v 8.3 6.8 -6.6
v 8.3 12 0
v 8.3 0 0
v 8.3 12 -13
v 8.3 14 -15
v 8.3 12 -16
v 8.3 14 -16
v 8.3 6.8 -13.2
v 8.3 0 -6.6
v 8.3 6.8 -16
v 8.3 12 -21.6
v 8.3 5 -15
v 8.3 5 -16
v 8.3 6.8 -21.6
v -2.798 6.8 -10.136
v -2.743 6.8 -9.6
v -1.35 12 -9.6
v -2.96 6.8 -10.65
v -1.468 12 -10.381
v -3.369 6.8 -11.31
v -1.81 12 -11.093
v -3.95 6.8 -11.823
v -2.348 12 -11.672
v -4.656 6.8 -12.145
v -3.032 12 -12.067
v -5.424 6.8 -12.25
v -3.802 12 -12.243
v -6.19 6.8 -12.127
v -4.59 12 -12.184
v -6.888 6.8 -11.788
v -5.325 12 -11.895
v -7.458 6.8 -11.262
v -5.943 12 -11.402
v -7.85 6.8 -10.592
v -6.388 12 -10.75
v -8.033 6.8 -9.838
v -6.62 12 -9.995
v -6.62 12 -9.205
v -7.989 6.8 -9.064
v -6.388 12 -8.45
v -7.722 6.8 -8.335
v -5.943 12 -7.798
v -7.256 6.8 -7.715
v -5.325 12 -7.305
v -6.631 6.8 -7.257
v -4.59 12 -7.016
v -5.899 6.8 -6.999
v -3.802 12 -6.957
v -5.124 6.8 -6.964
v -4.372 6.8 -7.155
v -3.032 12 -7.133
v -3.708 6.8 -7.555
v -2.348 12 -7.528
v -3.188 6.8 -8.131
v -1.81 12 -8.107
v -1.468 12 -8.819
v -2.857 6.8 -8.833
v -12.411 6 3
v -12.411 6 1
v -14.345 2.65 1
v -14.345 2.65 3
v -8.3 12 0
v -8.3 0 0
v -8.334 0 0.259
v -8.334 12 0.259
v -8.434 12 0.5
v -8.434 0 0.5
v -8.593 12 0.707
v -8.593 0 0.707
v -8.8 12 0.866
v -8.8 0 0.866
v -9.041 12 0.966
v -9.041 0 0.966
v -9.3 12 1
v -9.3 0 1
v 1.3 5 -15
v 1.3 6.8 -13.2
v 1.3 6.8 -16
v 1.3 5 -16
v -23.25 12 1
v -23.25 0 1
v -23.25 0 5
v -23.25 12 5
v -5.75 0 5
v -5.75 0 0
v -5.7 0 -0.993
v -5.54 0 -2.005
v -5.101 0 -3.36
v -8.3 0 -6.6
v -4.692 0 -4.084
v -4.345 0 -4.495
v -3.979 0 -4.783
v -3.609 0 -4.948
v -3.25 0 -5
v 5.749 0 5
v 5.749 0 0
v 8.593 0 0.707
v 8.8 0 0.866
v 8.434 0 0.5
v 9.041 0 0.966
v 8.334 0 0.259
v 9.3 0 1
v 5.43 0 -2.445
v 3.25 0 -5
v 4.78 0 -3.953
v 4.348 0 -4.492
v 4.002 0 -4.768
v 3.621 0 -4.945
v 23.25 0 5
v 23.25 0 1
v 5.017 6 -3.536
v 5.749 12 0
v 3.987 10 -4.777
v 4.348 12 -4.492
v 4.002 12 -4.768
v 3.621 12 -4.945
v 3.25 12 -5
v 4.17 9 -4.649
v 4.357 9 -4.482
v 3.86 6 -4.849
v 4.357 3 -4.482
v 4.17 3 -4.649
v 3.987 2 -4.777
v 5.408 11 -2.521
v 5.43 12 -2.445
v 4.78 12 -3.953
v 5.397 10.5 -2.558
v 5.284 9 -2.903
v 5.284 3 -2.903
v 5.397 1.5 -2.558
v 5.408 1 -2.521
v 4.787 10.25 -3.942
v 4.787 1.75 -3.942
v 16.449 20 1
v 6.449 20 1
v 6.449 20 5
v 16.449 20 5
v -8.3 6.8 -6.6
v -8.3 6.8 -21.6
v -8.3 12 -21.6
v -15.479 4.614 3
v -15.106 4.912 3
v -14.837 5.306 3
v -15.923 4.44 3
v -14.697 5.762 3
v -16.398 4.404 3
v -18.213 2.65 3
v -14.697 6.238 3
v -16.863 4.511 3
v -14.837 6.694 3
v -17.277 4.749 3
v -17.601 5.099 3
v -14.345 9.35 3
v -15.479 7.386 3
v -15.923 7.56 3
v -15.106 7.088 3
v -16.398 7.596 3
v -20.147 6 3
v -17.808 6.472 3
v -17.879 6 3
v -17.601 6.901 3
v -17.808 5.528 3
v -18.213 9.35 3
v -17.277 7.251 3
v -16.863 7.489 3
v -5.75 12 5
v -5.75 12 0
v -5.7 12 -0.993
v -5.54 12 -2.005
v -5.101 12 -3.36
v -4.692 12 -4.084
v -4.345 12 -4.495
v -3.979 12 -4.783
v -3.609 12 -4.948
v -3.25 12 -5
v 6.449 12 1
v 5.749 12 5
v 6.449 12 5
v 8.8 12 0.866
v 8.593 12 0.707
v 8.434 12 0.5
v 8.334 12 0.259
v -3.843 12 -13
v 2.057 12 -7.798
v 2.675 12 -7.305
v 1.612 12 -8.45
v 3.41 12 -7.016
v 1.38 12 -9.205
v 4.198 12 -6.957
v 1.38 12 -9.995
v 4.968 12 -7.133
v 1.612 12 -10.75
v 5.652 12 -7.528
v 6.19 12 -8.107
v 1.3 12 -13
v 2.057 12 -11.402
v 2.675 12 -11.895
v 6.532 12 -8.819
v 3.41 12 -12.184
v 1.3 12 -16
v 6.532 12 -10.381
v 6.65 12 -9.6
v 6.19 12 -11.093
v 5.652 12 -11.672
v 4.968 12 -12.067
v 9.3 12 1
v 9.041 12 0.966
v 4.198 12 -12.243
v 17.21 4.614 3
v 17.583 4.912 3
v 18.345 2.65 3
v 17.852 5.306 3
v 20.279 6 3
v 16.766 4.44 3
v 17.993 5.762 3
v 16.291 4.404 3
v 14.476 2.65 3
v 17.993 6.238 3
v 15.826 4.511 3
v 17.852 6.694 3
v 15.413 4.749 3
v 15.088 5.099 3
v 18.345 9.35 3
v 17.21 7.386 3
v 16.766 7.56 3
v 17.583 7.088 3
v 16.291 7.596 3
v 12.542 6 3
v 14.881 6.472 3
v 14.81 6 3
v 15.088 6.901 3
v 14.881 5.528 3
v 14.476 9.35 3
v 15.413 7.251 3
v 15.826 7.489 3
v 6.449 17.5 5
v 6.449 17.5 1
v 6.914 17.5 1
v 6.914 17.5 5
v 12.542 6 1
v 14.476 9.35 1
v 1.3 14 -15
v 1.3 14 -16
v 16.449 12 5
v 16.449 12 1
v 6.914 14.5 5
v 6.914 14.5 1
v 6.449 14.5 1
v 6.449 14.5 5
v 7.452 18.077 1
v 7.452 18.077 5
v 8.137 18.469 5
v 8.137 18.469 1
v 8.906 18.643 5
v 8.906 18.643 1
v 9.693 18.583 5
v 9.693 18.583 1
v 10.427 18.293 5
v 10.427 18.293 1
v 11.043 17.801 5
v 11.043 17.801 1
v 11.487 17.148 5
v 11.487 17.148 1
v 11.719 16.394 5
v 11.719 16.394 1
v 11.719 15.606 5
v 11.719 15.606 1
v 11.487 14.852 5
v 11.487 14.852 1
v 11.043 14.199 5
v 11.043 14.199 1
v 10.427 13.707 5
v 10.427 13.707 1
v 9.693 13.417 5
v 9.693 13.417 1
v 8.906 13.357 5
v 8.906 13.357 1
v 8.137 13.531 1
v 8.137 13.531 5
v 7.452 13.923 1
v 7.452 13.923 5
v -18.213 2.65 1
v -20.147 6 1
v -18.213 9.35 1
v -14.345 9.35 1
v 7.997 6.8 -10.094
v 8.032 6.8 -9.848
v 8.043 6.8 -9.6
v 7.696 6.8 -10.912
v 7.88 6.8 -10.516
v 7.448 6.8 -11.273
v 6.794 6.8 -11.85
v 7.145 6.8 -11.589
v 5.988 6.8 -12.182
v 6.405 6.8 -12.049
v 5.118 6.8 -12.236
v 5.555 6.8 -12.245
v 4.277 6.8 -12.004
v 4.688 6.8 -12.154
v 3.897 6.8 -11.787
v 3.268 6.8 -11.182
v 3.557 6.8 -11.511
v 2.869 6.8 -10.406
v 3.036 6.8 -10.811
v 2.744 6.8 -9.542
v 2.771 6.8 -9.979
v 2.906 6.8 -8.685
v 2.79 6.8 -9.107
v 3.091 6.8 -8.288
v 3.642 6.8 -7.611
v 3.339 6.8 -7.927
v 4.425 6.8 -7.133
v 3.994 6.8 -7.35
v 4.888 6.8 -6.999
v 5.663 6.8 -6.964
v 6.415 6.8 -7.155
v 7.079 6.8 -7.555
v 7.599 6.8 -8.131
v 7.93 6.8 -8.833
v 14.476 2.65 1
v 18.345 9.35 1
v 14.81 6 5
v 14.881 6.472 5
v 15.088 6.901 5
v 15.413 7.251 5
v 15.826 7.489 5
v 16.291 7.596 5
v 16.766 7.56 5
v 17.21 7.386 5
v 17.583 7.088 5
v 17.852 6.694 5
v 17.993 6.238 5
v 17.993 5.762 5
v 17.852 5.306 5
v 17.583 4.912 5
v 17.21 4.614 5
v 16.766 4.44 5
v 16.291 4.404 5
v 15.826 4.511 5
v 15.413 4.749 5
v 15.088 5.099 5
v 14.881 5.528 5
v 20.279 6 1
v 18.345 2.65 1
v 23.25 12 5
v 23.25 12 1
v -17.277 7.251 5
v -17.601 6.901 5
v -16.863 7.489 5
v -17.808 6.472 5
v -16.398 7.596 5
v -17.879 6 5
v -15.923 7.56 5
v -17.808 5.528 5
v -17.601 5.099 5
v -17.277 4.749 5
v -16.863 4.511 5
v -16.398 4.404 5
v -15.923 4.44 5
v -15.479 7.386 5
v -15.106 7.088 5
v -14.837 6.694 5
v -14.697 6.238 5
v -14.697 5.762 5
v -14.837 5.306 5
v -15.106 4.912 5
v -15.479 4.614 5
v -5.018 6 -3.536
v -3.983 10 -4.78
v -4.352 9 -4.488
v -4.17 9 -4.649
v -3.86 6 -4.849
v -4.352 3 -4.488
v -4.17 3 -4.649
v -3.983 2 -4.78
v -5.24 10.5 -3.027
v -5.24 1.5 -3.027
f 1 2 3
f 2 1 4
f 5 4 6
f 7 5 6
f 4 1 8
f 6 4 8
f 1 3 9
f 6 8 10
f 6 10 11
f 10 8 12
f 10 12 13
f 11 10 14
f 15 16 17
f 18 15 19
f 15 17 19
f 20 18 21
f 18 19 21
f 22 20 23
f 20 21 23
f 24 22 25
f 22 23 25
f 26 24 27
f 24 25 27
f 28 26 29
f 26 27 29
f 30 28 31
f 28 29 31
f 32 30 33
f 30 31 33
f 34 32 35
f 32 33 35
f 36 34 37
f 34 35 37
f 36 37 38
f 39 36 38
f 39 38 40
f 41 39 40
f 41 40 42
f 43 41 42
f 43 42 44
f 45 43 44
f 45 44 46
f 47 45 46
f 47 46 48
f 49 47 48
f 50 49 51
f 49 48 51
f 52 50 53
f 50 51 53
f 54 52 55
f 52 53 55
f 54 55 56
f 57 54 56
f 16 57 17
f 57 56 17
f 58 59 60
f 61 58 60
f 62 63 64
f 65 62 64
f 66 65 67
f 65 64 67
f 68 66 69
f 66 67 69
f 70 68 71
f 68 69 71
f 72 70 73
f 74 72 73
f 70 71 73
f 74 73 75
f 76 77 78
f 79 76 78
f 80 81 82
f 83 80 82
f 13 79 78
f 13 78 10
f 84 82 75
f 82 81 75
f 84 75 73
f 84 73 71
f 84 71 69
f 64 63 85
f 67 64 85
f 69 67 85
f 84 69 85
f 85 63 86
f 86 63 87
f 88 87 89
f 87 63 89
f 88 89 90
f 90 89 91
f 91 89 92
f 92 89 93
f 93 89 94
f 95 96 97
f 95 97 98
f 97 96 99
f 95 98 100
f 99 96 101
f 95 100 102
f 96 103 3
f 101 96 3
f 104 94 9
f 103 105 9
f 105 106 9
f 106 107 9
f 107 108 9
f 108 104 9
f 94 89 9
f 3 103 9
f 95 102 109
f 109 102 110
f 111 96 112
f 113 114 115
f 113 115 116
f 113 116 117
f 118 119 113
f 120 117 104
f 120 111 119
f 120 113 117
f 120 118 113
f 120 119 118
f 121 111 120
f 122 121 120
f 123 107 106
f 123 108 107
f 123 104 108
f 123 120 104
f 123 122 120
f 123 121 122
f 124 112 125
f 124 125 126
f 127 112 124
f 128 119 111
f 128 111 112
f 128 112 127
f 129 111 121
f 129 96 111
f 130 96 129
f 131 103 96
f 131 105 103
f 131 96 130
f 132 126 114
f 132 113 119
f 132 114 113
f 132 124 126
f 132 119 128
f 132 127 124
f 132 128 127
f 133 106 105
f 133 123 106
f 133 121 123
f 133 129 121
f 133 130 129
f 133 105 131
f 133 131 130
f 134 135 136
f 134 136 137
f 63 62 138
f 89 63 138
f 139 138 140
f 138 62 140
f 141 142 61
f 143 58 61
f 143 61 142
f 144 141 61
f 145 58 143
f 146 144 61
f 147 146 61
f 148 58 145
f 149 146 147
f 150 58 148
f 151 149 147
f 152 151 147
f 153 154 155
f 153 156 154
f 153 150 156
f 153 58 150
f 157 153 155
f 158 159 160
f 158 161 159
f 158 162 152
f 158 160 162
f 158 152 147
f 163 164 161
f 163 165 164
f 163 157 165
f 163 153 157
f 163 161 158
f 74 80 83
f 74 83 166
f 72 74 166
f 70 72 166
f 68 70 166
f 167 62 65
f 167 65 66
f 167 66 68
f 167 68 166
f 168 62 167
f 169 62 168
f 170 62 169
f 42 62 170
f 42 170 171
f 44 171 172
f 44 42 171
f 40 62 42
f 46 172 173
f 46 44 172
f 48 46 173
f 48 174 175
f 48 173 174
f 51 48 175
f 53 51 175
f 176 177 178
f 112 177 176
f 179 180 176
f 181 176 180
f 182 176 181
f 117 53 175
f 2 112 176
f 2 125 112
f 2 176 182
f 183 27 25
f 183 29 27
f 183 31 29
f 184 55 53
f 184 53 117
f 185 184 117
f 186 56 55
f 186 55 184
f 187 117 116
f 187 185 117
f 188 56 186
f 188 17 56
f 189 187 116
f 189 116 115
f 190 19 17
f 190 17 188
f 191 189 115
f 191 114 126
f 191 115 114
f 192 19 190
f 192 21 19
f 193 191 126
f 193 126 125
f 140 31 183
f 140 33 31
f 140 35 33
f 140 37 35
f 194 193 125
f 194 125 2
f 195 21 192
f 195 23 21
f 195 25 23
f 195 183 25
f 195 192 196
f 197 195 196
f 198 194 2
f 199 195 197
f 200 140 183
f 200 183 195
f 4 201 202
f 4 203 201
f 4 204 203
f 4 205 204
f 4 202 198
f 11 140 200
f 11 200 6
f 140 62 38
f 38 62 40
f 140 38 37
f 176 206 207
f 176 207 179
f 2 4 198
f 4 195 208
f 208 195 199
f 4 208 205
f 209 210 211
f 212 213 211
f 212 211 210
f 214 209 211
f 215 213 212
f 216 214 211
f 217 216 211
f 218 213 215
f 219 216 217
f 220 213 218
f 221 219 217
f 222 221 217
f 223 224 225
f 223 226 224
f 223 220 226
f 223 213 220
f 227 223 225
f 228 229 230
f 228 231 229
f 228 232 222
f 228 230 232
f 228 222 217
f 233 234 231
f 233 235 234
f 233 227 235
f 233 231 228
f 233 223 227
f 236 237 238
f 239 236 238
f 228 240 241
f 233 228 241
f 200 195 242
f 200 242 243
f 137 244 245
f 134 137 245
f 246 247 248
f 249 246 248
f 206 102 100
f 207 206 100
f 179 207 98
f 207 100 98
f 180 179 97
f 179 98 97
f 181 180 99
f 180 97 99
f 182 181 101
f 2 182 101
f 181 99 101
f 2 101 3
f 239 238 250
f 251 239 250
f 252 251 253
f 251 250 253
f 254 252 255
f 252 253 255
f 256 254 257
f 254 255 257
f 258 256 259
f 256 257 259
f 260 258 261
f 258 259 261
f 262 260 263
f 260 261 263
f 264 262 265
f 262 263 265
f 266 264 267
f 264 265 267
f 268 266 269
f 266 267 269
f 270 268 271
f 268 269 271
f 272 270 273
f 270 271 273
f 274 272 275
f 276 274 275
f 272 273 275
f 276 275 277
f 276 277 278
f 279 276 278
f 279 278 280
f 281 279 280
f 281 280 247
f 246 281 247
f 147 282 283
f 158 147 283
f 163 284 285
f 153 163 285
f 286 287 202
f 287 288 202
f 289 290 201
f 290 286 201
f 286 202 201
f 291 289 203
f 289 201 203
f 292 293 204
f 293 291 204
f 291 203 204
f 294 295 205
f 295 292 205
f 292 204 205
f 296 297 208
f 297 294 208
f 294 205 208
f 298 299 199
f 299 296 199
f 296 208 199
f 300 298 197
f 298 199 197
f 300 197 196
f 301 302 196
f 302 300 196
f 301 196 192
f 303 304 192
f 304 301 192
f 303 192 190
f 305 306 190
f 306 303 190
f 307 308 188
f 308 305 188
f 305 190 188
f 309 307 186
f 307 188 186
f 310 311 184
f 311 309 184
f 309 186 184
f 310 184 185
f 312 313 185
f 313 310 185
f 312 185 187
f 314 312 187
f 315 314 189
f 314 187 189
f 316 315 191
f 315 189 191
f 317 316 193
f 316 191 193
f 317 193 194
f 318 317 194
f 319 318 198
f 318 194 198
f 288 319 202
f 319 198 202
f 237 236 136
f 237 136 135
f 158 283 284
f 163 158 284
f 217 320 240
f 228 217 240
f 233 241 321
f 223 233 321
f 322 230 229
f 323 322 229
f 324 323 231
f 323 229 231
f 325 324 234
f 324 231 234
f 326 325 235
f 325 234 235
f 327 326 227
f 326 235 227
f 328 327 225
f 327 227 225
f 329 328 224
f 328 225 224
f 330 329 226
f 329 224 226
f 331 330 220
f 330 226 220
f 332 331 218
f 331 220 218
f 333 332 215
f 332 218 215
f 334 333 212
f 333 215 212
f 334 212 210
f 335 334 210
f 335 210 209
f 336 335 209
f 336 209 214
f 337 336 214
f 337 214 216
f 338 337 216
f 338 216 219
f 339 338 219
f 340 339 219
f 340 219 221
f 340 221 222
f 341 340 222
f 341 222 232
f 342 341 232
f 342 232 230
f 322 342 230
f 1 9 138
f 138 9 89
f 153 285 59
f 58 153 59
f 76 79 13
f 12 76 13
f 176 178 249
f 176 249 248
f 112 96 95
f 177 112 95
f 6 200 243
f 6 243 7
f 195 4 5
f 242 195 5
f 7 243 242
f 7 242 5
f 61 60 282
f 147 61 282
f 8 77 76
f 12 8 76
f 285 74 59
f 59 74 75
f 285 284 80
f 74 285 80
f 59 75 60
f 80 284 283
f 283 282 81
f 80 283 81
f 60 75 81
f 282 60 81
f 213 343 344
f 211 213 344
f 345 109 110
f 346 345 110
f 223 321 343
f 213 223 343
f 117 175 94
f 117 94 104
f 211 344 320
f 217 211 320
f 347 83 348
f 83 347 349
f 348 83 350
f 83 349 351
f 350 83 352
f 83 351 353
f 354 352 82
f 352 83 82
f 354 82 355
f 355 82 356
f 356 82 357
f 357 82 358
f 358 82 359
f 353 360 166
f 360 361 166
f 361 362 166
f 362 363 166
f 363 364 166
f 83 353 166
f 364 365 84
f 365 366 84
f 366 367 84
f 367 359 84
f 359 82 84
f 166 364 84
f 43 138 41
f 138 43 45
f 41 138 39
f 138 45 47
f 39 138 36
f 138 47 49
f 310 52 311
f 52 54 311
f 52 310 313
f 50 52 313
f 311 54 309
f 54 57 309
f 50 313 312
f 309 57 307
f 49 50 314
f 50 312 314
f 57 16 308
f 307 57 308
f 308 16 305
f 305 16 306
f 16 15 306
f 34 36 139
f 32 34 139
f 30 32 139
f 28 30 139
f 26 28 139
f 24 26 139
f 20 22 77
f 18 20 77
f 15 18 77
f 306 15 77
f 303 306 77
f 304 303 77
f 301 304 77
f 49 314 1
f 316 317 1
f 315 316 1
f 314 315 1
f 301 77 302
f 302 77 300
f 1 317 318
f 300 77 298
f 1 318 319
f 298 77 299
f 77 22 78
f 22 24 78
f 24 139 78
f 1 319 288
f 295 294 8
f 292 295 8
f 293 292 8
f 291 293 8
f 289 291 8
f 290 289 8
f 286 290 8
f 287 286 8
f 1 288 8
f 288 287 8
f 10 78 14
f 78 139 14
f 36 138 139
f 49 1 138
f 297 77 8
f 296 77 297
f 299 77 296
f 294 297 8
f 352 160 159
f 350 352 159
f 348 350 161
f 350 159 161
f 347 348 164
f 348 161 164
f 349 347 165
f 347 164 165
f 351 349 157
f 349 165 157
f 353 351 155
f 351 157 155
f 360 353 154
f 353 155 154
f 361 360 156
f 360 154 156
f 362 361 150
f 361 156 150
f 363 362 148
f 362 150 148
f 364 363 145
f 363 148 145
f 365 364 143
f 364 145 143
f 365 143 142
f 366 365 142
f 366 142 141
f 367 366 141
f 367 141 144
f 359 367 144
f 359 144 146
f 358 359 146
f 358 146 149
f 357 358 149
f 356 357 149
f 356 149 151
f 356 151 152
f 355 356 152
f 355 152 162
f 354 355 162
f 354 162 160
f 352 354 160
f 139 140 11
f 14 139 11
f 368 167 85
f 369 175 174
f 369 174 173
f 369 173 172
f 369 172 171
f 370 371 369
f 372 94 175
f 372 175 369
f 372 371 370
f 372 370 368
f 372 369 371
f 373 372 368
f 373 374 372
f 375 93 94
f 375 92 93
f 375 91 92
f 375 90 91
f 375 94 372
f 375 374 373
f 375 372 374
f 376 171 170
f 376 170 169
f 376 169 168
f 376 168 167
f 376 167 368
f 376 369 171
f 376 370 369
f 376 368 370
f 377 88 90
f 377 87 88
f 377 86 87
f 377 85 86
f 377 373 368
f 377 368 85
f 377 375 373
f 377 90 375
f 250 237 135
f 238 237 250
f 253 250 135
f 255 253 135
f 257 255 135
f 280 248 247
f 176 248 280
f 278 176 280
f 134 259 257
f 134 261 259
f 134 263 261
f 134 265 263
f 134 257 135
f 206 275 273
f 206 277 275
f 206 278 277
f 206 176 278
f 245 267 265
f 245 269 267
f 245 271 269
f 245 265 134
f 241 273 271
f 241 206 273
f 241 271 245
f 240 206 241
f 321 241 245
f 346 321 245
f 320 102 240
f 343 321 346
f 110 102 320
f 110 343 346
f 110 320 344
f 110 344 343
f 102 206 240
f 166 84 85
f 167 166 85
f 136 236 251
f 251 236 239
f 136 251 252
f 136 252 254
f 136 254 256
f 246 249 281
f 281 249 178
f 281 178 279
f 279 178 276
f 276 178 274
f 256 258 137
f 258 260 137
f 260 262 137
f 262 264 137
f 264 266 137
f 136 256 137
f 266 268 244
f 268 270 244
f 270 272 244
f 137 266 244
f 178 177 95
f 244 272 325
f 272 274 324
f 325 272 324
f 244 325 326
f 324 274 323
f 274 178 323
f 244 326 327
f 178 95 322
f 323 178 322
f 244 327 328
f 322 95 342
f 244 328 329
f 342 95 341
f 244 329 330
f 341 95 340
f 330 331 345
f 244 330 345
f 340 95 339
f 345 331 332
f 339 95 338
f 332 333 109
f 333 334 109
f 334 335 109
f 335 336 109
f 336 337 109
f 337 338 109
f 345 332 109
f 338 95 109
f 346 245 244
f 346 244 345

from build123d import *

# Parameters (mm, degrees)
BOSS_EXTRUDE1_DEPTH      = 12
CUT_EXTRUDE1_DEPTH       = 2
SKETCH3_W                = 16.6
SKETCH3_H                = 15
BOSS_EXTRUDE2_DEPTH      = 5.2
SKETCH5_R                = 1.6
CUT_EXTRUDE2_DEPTH       = 5
SKETCH6_W                = 10
SKETCH6_H                = 4
BOSS_EXTRUDE4_DEPTH      = 8
CUT_EXTRUDE4_DEPTH       = 7
SKETCH8_R                = 2.65
CUT_EXTRUDE5_DEPTH       = 7
SKETCH10_R               = 2.65
CUT_EXTRUDE6_DEPTH       = 7
BOSS_EXTRUDE6_DEPTH      = 2
BOSS_EXTRUDE6_DEPTH_BACK = 7
SKETCH11_W               = 7
SKETCH11_H               = 3
CHAMFER2_SIZE            = 2


with BuildPart() as part:
    # Sketch1 → Boss-Extrude1 (new body)
    with BuildSketch(Plane(origin=(0, 0, 0), x_dir=(1, 0, 0), z_dir=(0, 1, 0))):
        with BuildLine():
            Line((-23.25, -5), (-5.749755012, -5))
            Line((-5.749755012, -5), (-5.749755012, 0))
            add(Edge.make_bspline(
                [(-3.25, 5), (-5.749755012, 5), (-5.749755012, 0)],
                knots=[0, 0, 0, 1.570796327, 1.570796327, 1.570796327], degree=2, weights=[1, 0.707106781, 1]))
            Line((-3.25, 5), (3.25, 5))
            add(Edge.make_bspline(
                [(5.748694825, 0), (5.748694825, 5), (3.25, 5)],
                knots=[4.71238898, 4.71238898, 4.71238898, 6.283185307, 6.283185307, 6.283185307], degree=2, weights=[1, 0.707106781, 1]))
            Line((5.748694825, 0), (5.748694825, -5))
            Line((5.748694825, -5), (23.25, -5))
            Line((23.25, -5), (23.25, -3))
            Line((23.25, -3), (23.25, -1))
            Line((23.25, -1), (9.3, -1))
            ThreePointArc((9.3, -1), (8.592893219, -0.707106781), (8.3, 0))
            Line((8.3, 0), (8.3, 6.6))
            Line((8.3, 6.6), (-8.3, 6.6))
            Line((-8.3, 6.6), (-8.3, 0))
            ThreePointArc((-8.3, 0), (-8.592893219, -0.707106781), (-9.3, -1))
            Line((-9.3, -1), (-23.25, -1))
            Line((-23.25, -1), (-23.25, -5))
        make_face()
    extrude(amount=BOSS_EXTRUDE1_DEPTH)

    # Sketch2 → Cut-Extrude1 (cut)
    with BuildSketch(Plane(origin=(0, 0, 1), x_dir=(-1, 0, 0), z_dir=(0, 0, -1))):
        Polygon((20.147177825, 6), (18.213054423, 9.35), (14.344807619, 9.35), (12.410684218, 6), (14.344807619, 2.65), (18.213054423, 2.65), align=None)
        Polygon((-12.542169585, 6), (-14.476292987, 9.35), (-18.34453979, 9.35), (-20.278663192, 6), (-18.34453979, 2.65), (-14.476292987, 2.65), align=None)
    extrude(amount=-CUT_EXTRUDE1_DEPTH, mode=Mode.SUBTRACT)

    # Sketch3 → Boss-Extrude2 (add)
    with BuildSketch(Plane(origin=(0, 12, 0), x_dir=(1, 0, 0), z_dir=(0, 1, 0))):
        with Locations((0, 14.1)):
            Rectangle(SKETCH3_W, SKETCH3_H)
    extrude(amount=-BOSS_EXTRUDE2_DEPTH)

    # Sketch5 → Cut-Extrude2 (cut)
    with BuildSketch(Plane(origin=(0, 0, 1), x_dir=(-1, 0, 0), z_dir=(0, 0, -1))):
        with Locations((-16.410416388, 6)):
            Circle(SKETCH5_R)
        with Locations((16.278931021, 6)):
            Circle(SKETCH5_R)
    extrude(amount=-CUT_EXTRUDE2_DEPTH, mode=Mode.SUBTRACT)

    # Sketch6 → Boss-Extrude4 (add)
    with BuildSketch(Plane(origin=(0, 12, 0), x_dir=(1, 0, 0), z_dir=(0, 1, 0))):
        with Locations((11.448694825, -3)):
            Rectangle(SKETCH6_W, SKETCH6_H)
    extrude(amount=BOSS_EXTRUDE4_DEPTH)

    # Sketch7 → Cut-Extrude4 (cut)
    with BuildSketch(Plane(origin=(0, 0, 1), x_dir=(-1, 0, 0), z_dir=(0, 0, -1))):
        with BuildLine():
            ThreePointArc((-6.448694825, 16), (-6.567716372, 16.785269427), (-6.914089597, 17.5))
            Line((-6.914089597, 17.5), (-7.999397269, 17.5))
            Line((-7.999397269, 17.5), (-7.999397269, 14.5))
            Line((-7.999397269, 14.5), (-6.914089597, 14.5))
            ThreePointArc((-6.914089597, 14.5), (-6.567716372, 15.214730573), (-6.448694825, 16))
        make_face()
        with BuildLine():
            Line((-7.999397269, 17.5), (-6.914089597, 17.5))
            ThreePointArc((-6.914089597, 17.5), (-11.748694825, 16), (-6.914089597, 14.5))
            Line((-6.914089597, 14.5), (-7.999397269, 14.5))
            Line((-7.999397269, 14.5), (-7.999397269, 17.5))
        make_face()
        with BuildLine():
            Line((-6.448694825, 14.5), (-6.448694825, 16))
            ThreePointArc((-6.448694825, 16), (-6.567716372, 15.214730573), (-6.914089597, 14.5))
            Line((-6.914089597, 14.5), (-6.448694825, 14.5))
        make_face()
        with BuildLine():
            Line((-6.448694825, 16), (-6.448694825, 17.5))
            Line((-6.448694825, 17.5), (-6.914089597, 17.5))
            ThreePointArc((-6.914089597, 17.5), (-6.567716372, 16.785269427), (-6.448694825, 16))
        make_face()
    extrude(amount=-CUT_EXTRUDE4_DEPTH, mode=Mode.SUBTRACT)

    # Sketch8 → Cut-Extrude5 (cut, along a direction that is not the sketch's normal)
    with BuildSketch(Plane(origin=(0, 12, 0), x_dir=(1, 0, 0), z_dir=(0, 1, 0))):
        with Locations((-4, 9.6)):
            Circle(SKETCH8_R)
    extrude(amount=-CUT_EXTRUDE5_DEPTH, dir=(0.2588190451025147, 0.96592582628907, -1.457918124587514e-13), mode=Mode.SUBTRACT)

    # Sketch10 → Cut-Extrude6 (cut, along a direction that is not the sketch's normal)
    with BuildSketch(Plane(origin=(0, 12, 0), x_dir=(1, 0, 0), z_dir=(0, 1, 0))):
        with Locations((4, 9.6)):
            Circle(SKETCH10_R)
    extrude(amount=-CUT_EXTRUDE6_DEPTH, dir=(-0.25881904510251447, 0.96592582628907, 0), mode=Mode.SUBTRACT)

    # Sketch11 → Boss-Extrude6 (add, two sides: drawn at the far end of the back side and taken through both)
    with BuildSketch(Plane(origin=(0, 12, 0), x_dir=(1, 0, 0), z_dir=(0, 1, 0)).offset(-BOSS_EXTRUDE6_DEPTH_BACK)):
        with Locations((4.8, 14.5)):
            Rectangle(SKETCH11_W, SKETCH11_H)
    extrude(amount=BOSS_EXTRUDE6_DEPTH + BOSS_EXTRUDE6_DEPTH_BACK)

    # Chamfer2
    # the kernel refuses this chamfer: 2 mm, written as the material it takes off along each edge
    with BuildSketch(Plane(origin=(13.443365976, 5, -13), x_dir=(0, 0.9996219169112968, 0.027495876610586487), z_dir=(-1, 0, 0))) as chamfer2_piece_1_section:
        Polygon((CHAMFER2_SIZE * 0.999621916911, CHAMFER2_SIZE * 0.0274958766106), (-CHAMFER2_SIZE * 0.0274958766106, CHAMFER2_SIZE * 0.999621916911), (0, 0), align=None)
    chamfer2_piece_1 = extrude(amount=17.286731952, mode=Mode.PRIVATE)
    chamfer2_piece_1 = split(chamfer2_piece_1, bisect_by=Plane(origin=(4.8, 6.8, -13.671801494), z_dir=(0, -1, 0)), keep=Keep.TOP, mode=Mode.PRIVATE)
    add(chamfer2_piece_1, mode=Mode.SUBTRACT)
    with BuildSketch(Plane(origin=(13.443365976, 14, -13), x_dir=(0, -0.9996219169112968, 0.027495876610586487), z_dir=(-1, 0, 0))) as chamfer2_piece_2_section:
        Polygon((CHAMFER2_SIZE * 0.999621916911, -CHAMFER2_SIZE * 0.0274958766106), (-CHAMFER2_SIZE * 0.0274958766106, -CHAMFER2_SIZE * 0.999621916911), (0, 0), align=None)
    chamfer2_piece_2 = extrude(amount=17.286731952, mode=Mode.PRIVATE)
    chamfer2_piece_2 = split(chamfer2_piece_2, bisect_by=Plane(origin=(4.8, 12, -13.660808309), z_dir=(0, 1, 0)), keep=Keep.TOP, mode=Mode.PRIVATE)
    add(chamfer2_piece_2, mode=Mode.SUBTRACT)


solid = part.part
